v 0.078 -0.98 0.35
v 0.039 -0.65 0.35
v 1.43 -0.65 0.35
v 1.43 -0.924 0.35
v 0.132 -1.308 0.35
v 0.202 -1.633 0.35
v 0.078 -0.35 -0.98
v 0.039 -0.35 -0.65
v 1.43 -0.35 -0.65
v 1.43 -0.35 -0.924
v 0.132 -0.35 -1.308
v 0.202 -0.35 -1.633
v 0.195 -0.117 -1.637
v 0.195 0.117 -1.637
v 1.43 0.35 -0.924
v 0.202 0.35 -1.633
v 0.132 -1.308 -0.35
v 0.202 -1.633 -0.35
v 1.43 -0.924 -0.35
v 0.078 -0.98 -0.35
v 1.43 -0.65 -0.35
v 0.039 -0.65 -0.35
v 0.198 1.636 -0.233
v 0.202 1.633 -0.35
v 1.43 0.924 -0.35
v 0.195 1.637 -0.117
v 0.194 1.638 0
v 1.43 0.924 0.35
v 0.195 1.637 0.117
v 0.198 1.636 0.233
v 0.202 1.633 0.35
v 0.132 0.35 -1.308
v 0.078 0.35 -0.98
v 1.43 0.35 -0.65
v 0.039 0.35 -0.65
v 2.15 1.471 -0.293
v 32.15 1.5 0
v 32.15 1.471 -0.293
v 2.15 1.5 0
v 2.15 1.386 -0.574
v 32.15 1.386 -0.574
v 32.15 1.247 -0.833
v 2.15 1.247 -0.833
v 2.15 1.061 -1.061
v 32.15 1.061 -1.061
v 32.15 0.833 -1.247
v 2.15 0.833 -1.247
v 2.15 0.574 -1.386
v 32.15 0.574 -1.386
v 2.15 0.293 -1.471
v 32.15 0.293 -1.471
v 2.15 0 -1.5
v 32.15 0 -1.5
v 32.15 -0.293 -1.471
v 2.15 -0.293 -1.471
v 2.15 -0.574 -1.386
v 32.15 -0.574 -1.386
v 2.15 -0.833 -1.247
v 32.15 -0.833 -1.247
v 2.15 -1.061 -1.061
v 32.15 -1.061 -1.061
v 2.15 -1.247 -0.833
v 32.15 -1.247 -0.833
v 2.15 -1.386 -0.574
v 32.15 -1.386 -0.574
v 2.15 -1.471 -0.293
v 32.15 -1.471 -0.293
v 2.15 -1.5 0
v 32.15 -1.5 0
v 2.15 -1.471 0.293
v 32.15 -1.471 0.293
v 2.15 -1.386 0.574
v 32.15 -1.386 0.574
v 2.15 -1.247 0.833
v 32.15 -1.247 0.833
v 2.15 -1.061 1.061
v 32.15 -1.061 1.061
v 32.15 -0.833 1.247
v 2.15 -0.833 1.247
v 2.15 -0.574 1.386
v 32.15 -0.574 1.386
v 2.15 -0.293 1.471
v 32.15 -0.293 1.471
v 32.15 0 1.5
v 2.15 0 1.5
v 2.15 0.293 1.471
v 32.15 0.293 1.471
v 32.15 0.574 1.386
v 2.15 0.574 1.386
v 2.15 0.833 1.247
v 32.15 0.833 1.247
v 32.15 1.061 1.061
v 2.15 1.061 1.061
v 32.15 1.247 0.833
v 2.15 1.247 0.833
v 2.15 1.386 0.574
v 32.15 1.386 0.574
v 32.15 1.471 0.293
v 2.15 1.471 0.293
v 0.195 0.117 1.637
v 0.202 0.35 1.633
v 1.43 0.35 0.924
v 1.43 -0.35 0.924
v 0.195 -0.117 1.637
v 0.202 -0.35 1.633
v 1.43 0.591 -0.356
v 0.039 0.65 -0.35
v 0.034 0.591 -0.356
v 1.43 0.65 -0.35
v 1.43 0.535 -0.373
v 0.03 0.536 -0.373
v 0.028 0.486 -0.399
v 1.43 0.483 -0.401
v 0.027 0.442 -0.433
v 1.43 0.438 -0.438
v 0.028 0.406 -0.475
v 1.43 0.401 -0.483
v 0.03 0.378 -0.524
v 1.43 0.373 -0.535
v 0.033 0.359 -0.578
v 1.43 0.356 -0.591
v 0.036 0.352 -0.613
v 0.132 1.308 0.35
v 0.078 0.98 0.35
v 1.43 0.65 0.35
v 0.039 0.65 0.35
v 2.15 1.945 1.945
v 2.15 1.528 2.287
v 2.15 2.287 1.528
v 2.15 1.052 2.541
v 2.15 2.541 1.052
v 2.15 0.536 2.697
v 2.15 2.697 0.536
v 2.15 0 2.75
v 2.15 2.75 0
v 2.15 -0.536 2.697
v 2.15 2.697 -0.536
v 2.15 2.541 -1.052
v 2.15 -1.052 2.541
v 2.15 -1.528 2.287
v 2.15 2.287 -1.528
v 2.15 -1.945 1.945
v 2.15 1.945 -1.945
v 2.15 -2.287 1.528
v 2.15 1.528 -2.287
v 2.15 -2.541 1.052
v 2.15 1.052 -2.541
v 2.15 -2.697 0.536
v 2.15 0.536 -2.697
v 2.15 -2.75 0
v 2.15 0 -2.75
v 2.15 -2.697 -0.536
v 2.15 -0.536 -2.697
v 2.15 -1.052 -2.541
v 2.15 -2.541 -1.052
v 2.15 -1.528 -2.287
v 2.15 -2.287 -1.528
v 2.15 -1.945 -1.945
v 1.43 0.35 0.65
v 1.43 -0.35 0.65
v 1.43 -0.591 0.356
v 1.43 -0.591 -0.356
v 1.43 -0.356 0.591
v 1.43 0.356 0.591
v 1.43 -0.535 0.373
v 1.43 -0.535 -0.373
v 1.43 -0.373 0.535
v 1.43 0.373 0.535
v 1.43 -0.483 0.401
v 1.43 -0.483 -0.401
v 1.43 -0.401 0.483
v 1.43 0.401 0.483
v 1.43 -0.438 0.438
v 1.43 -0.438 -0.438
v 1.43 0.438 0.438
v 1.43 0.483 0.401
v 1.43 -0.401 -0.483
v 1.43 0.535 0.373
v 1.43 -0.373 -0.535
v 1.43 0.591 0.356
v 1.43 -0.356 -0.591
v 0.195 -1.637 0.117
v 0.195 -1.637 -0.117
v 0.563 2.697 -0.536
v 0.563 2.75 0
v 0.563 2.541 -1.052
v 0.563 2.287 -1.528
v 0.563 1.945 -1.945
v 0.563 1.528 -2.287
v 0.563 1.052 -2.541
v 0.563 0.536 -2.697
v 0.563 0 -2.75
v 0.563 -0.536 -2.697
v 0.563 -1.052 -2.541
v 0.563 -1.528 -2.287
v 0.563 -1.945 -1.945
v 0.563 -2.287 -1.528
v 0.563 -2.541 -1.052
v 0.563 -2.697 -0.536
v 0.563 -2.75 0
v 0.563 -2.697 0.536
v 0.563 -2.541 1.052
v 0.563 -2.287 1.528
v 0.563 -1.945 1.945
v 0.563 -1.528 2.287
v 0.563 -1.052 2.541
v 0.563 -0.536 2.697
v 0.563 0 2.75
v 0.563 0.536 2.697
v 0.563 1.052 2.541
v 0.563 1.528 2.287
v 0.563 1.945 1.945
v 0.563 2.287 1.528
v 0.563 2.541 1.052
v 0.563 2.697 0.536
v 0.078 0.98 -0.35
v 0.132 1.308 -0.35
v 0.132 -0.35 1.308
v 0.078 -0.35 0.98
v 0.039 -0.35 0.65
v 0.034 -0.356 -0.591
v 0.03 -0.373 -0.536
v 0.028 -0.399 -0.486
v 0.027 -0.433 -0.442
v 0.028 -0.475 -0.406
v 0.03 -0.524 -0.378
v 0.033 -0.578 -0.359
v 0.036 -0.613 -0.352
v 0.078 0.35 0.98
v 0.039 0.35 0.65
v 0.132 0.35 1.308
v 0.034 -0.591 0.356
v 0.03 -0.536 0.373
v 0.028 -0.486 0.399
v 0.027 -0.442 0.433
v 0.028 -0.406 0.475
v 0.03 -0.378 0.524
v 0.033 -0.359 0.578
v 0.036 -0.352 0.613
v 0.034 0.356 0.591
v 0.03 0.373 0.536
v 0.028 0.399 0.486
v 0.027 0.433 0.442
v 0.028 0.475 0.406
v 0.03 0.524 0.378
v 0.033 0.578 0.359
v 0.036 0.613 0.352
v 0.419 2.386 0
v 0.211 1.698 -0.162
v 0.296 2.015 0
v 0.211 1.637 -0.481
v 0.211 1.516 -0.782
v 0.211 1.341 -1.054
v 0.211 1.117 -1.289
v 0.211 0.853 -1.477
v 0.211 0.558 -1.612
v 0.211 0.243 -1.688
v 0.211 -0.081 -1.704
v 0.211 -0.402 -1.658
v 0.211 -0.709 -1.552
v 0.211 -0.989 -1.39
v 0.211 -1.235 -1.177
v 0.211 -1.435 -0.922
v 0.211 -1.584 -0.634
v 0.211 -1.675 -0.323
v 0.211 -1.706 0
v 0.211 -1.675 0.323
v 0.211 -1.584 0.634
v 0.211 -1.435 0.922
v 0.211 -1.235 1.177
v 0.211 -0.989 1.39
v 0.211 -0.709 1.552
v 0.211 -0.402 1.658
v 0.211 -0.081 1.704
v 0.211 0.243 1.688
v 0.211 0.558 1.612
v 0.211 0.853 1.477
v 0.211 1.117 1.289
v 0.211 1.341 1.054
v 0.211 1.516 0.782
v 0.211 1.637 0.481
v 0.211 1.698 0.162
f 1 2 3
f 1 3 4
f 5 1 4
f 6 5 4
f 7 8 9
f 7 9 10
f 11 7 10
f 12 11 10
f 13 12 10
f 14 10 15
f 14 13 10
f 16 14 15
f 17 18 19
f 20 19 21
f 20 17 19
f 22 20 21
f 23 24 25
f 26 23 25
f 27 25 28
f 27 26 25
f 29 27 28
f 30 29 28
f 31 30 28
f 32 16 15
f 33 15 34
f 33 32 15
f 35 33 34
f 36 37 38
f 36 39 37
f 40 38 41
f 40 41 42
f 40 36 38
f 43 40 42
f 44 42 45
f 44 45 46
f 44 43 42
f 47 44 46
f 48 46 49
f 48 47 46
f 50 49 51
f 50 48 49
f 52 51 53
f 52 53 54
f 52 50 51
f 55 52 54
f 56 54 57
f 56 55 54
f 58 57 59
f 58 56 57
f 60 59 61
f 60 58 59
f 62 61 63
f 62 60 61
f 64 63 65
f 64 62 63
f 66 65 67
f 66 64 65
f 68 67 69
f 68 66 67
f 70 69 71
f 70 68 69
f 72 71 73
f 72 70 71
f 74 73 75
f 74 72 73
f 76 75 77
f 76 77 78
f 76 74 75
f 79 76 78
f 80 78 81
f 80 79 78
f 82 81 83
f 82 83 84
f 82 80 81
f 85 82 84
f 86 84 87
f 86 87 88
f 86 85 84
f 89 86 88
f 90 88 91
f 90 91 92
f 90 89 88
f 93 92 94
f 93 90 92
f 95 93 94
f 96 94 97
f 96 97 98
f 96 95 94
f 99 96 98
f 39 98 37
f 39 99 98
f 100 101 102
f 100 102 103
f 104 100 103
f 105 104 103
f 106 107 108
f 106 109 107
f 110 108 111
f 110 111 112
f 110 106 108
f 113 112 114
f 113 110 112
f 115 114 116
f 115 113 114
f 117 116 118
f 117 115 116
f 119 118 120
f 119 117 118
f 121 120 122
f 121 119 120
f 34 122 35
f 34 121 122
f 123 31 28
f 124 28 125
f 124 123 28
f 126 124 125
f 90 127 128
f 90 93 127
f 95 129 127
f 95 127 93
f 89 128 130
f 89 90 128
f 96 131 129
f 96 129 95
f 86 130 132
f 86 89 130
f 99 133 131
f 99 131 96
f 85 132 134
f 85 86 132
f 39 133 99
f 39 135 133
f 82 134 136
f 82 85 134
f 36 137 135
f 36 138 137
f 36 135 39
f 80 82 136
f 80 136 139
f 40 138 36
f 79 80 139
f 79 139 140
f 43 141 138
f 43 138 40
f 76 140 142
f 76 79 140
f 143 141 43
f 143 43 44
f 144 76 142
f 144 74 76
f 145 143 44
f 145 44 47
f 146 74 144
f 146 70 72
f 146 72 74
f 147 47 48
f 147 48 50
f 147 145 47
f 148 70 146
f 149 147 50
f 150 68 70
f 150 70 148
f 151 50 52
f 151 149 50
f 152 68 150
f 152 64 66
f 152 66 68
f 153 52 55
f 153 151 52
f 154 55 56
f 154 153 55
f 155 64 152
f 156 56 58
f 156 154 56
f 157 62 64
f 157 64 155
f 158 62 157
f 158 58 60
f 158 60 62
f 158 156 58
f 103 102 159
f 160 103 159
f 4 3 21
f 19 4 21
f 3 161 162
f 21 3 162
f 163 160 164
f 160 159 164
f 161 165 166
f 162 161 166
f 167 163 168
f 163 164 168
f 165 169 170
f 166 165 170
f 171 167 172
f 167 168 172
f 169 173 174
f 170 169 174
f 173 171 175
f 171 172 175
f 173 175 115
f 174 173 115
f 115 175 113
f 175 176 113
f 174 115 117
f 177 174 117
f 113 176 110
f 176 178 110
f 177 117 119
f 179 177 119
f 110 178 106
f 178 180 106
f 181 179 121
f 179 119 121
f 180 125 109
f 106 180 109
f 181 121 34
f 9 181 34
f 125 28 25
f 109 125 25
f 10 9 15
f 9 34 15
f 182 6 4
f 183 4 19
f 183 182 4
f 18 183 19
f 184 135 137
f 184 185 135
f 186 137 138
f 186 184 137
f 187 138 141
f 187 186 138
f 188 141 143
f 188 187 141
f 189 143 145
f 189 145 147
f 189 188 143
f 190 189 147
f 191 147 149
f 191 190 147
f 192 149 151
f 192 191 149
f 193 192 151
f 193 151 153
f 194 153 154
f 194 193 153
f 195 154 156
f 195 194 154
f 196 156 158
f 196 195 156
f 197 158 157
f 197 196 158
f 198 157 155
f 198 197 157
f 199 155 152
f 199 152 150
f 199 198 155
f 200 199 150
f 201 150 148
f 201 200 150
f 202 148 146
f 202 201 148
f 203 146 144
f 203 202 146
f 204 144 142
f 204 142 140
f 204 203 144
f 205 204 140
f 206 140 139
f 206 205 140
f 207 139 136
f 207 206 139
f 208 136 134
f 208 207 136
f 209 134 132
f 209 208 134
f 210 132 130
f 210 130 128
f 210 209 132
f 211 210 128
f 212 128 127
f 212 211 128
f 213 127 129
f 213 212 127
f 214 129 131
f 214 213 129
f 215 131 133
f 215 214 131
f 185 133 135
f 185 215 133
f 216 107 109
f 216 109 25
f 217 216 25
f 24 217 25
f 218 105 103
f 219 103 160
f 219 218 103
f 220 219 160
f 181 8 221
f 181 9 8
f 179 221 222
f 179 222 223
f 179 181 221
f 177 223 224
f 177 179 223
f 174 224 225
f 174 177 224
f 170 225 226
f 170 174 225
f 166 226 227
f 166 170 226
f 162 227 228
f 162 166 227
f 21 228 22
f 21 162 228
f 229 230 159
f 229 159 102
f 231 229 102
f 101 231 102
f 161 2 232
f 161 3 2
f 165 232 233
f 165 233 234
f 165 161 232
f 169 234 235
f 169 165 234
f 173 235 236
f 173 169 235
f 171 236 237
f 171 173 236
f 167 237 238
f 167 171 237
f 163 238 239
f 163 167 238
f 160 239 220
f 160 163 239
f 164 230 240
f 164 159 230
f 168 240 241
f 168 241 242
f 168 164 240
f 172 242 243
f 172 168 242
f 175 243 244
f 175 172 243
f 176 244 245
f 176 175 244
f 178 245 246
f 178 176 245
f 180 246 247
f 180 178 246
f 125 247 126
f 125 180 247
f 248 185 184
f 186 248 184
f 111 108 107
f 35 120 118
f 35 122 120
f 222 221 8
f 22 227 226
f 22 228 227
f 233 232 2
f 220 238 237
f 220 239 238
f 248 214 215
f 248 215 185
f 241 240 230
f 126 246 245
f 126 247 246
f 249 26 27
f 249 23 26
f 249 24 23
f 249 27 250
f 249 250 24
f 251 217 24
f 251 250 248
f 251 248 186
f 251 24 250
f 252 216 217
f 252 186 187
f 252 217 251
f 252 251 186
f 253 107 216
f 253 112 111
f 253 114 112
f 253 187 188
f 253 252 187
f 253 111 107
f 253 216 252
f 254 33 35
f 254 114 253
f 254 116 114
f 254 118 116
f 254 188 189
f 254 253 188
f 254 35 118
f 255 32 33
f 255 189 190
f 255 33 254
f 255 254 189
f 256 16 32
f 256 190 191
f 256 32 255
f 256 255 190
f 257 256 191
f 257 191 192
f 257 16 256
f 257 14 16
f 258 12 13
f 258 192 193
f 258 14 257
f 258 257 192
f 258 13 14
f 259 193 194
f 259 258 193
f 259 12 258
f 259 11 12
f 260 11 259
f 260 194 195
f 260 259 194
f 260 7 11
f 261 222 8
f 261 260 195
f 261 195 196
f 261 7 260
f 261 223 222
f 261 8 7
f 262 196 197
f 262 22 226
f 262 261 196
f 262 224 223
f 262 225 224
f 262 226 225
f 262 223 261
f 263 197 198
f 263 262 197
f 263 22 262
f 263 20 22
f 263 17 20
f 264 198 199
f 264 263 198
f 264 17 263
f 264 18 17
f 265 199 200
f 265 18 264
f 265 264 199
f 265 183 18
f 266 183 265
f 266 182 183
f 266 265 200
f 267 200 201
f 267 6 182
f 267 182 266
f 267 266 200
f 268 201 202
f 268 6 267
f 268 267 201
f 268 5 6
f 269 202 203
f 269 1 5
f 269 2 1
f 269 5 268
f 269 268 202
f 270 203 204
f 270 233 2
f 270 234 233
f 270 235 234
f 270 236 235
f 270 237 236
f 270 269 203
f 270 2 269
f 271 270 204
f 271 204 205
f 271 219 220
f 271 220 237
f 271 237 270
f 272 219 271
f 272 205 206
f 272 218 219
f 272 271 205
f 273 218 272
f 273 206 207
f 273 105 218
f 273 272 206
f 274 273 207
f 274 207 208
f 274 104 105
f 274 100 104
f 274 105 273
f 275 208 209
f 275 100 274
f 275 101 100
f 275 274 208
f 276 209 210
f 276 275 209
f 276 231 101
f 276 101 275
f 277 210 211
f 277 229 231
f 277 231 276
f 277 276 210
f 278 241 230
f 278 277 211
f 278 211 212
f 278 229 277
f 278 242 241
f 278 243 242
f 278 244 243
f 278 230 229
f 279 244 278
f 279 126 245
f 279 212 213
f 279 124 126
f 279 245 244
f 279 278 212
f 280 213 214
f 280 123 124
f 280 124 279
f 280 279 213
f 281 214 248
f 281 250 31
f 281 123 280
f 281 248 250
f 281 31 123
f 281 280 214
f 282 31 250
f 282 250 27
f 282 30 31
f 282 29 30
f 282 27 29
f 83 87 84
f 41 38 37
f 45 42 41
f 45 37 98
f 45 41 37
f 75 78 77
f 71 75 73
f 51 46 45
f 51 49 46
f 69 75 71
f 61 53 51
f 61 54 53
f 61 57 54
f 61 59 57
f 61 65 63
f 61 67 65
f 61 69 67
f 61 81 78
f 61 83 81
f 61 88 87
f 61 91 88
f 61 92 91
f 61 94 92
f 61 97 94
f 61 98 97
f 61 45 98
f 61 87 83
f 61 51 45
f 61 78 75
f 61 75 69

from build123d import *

# Parameters (mm, degrees)
CUT_EXTRUDE2_DEPTH = 1.43
FILLET5_R          = 0.3
DRAFT2_ANGLE       = -30


with BuildPart() as part:
    # Sketch1 → Base (revolve)
    with BuildSketch(Plane.XY):
        with BuildLine():
            Line((32.15, 1.5), (3.15, 1.5))
            Line((3.15, 1.5), (2.15, 1.5))
            Line((2.15, 1.5), (2.15, 1.8))
            Line((2.15, 1.8), (2.15, 2.75))
            Line((2.15, 2.75), (0.562803405, 2.75))
            ThreePointArc((0.562803405, 2.75), (0.142144061, 1.403499882), (0, 0))
            Line((0, 0), (32.15, 0))
            Line((32.15, 0), (32.15, 1.5))
        make_face()
    revolve(axis=Axis((4.515812911, 0, 0), (-1, 0, 0)))

    # Sketch6 → Cut-Extrude2 (cut)
    with BuildSketch(Plane(origin=(0, 0, 0), x_dir=(0, 0, -1), z_dir=(1, 0, 0))):
        Polygon((0.35, 0.35), (0.35, 1.75), (-0.35, 1.75), (-0.35, 0.35), (-1.75, 0.35), (-1.75, -0.35), (-0.35, -0.35), (-0.35, -1.75), (0.35, -1.75), (0.35, -0.35), (1.75, -0.35), (1.75, 0.35), align=None)
    extrude(amount=CUT_EXTRUDE2_DEPTH, mode=Mode.SUBTRACT)

    # Fillet5
    fillet5_edges = [part.edges().sort_by_distance(p)[0] for p in [
        (0.723760965, 0.35, 0.35),
        (0.723760965, -0.35, 0.35),
        (0.723760965, -0.35, -0.35),
        (0.723760965, 0.35, -0.35),
    ]]
    fillet(fillet5_edges, radius=FILLET5_R)

    # Draft2
    draft2_faces = [part.faces().sort_by_distance(p)[0] for p in [
        (0.827643319, 0, 1.75),
        (0.827643319, 1.75, 0),
        (0.827643319, -1.75, 0),
        (0.827643319, 0, -1.75),
    ]]
    draft(draft2_faces, Plane(origin=(0, 0, 0), x_dir=(0, 0, 1), z_dir=(1, 0, 0)), DRAFT2_ANGLE)


solid = part.part
